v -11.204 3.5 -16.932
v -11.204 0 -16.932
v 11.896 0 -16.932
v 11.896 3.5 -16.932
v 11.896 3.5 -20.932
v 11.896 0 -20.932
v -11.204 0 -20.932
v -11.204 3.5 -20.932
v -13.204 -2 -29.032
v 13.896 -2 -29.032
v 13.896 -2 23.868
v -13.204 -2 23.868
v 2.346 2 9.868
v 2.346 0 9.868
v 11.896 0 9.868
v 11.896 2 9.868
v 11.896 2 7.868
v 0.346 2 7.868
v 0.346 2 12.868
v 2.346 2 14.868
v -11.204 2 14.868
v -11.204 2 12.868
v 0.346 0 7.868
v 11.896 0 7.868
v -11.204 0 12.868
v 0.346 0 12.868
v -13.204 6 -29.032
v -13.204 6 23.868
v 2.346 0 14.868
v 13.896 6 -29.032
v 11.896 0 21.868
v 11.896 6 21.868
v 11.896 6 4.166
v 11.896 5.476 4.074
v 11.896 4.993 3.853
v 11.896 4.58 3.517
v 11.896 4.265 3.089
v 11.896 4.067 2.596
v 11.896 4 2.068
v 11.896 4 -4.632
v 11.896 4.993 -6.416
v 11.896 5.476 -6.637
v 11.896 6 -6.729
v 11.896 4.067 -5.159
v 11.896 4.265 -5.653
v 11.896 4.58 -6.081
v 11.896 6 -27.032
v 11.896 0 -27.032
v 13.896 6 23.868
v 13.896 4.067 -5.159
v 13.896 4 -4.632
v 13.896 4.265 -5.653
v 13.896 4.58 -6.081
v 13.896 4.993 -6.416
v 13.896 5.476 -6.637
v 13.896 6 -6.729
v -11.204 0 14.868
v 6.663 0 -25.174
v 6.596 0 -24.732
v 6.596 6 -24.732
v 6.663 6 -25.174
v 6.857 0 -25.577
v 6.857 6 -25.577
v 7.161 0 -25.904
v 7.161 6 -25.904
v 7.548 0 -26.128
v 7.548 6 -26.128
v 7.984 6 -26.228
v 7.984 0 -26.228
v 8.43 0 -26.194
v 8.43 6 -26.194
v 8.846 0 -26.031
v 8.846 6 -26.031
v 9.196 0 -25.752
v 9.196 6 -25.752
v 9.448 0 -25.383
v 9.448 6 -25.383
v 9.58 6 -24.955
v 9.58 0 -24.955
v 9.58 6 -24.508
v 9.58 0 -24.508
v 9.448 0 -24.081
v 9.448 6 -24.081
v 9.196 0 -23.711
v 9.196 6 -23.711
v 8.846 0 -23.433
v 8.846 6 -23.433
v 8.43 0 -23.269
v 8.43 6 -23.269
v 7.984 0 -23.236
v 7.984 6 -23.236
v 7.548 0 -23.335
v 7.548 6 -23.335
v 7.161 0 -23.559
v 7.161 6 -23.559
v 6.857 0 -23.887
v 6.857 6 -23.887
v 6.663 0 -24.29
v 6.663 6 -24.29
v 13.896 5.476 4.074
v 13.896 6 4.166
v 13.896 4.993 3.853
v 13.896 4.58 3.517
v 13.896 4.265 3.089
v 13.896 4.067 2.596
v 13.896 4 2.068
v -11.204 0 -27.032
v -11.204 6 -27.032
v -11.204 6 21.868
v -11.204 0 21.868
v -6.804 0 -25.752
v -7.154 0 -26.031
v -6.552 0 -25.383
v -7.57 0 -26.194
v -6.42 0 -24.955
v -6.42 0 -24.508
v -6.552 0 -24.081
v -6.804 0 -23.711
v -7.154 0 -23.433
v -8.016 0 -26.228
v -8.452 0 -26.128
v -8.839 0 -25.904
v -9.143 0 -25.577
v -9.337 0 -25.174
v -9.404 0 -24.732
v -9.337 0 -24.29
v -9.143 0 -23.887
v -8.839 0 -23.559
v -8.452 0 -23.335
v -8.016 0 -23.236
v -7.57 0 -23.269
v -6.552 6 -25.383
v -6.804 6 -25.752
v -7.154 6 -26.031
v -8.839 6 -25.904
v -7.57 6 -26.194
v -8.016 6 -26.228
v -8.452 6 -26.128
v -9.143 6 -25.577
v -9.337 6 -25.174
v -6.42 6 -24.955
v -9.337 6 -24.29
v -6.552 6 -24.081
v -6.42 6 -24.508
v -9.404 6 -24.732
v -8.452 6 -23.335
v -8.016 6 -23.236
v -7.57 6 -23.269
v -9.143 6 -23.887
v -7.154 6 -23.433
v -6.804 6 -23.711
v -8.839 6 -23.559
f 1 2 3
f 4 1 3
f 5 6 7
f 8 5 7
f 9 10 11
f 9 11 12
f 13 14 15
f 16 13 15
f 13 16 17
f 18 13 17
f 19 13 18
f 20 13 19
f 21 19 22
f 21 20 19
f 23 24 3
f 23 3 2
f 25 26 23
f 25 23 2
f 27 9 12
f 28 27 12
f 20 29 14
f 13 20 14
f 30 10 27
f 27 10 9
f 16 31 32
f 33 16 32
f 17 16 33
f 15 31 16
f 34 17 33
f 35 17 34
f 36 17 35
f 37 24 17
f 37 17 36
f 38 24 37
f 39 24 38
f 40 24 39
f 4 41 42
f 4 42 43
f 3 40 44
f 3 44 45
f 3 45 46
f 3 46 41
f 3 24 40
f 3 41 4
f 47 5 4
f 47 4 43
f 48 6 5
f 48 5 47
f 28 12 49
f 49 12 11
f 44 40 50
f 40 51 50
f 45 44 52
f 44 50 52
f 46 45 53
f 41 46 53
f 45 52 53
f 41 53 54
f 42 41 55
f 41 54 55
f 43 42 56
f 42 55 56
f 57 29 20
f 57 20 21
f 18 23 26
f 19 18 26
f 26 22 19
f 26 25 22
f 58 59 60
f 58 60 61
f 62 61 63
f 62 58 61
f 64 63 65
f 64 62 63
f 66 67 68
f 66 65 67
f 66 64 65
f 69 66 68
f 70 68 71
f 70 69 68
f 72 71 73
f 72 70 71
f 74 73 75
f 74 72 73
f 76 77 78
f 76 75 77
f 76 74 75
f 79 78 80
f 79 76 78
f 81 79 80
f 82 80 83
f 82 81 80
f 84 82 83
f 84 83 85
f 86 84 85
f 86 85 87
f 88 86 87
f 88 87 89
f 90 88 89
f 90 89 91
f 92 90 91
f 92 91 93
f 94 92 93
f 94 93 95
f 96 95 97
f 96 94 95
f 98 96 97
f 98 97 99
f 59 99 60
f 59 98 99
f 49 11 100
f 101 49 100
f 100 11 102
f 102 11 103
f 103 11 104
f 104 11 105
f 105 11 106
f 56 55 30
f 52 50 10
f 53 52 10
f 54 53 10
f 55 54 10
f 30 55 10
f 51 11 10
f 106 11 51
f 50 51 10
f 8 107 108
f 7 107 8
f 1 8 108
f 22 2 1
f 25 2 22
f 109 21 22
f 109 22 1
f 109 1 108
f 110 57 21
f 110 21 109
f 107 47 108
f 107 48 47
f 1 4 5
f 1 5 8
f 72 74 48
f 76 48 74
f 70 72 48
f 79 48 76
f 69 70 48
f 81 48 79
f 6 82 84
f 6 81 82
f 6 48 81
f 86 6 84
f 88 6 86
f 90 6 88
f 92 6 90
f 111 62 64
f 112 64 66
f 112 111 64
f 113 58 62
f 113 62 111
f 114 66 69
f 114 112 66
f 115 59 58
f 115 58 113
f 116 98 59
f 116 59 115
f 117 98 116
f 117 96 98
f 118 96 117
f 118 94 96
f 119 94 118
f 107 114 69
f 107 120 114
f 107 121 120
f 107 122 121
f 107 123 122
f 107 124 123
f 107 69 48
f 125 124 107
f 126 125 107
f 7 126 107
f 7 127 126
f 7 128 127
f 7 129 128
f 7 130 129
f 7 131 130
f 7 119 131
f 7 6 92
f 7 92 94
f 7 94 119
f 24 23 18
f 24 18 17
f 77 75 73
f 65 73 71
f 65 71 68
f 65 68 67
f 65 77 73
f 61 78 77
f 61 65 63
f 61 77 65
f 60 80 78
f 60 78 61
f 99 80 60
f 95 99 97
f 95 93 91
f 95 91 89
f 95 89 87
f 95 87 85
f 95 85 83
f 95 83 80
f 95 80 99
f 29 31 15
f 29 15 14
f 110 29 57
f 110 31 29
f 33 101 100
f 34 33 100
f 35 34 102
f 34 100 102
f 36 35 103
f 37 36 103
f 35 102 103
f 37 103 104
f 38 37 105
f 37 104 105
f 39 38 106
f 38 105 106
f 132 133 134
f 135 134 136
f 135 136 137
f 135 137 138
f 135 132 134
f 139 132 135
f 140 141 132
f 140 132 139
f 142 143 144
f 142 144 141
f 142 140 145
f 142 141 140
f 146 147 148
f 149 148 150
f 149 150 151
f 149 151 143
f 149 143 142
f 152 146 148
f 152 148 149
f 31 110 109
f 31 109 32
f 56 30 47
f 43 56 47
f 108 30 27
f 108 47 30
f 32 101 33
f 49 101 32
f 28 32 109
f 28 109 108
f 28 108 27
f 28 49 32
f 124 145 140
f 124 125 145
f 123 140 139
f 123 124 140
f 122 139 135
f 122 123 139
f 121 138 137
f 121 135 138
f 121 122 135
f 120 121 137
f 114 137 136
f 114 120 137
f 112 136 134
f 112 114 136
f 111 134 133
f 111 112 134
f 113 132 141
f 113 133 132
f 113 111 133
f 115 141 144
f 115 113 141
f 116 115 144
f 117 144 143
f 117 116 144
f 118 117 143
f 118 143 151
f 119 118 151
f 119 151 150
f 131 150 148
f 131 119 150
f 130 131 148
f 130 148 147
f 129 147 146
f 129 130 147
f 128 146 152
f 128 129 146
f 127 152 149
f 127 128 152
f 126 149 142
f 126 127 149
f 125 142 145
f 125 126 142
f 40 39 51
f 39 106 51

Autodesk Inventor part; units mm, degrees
ref_plane "YZ Plane" through (0, 0, 0) normal (1, 0, 0) x (0, 1, 0)
ref_plane "XZ Plane" through (0, 0, 0) normal (0, 1, 0) x (-1, 0, 0)
ref_plane "XY Plane" through (0, 0, 0) normal (0, 0, 1) x (1, 0, 0)
sketch "Sketch1" plane through (0, 0, 0) normal (0, 1, 0) x (-1, 0, 0)
  circle A0 centre (-8.0963, -24.7317) radius 1.5
  circle A1 centre (7.9037, -24.7317) radius 1.5
  line L0 (-11.8963, -27.0317) -> (11.2037, -27.0317)
  line L1 (11.2037, 21.8683) -> (-11.8963, 21.8683)
  line L2 (-0.3463, 7.8683) -> (-0.3463, 9.8683)
  line L3 (-2.3463, 9.8683) -> (-11.8963, 9.8683)
  line L4 (-13.8963, -29.0317) -> (13.2037, -29.0317)
  line L5 (13.2037, -29.0317) -> (13.2037, 23.8683)
  line L6 (13.2037, 23.8683) -> (-13.8963, 23.8683)
  line L7 (-13.8963, 23.8683) -> (-13.8963, -29.0317)
  line L8 (-0.3463, 7.8683) -> (-11.8963, 7.8683)
  line L9 (-11.8963, 21.8683) -> (-11.8963, 7.8683)
  line L10 (11.2037, 12.8683) -> (-0.3463, 12.8683)
  line L11 (-0.3463, 9.8683) -> (-0.3463, 12.8683)
  line L12 (-2.3463, 14.8683) -> (-2.3463, 9.8683)
  line L13 (-2.3463, 14.8683) -> (11.2037, 14.8683)
  line L14 (11.2037, -16.9317) -> (-11.8963, -16.9317)
  line L15 (-11.8963, -20.9317) -> (11.2037, -20.9317)
  line L16 (-11.8963, 7.8683) -> (-11.8963, -20.9317)
  line L17 (-11.8963, -20.9317) -> (-11.8963, -27.0317)
  line L18 (11.2037, -27.0317) -> (11.2037, 21.8683)
  point P0 (0, 0)
  point P1 (-15.2463, -4.6317)
  dimension "d0" = 2
  dimension "d12" = 6.1
extrude "Extrusion1" add sketch "Sketch1" against normal blind 2 contours A0 | A1 | L17 L15 L18 L0 | L16 L14 L18 L15 | L16 L8 L2 L11 L10 L18 L14 | L9 L3 L12 L13 L18 L10 L11 L2 L8 | L9 L1 L18 L13 L12 L3 | L7 L6 L5 L4
extrude "Extrusion2" add sketch "Sketch1" along normal blind 6
extrude "Extrusion3" add sketch "Sketch1" along normal blind 2 contours L9 L3 L12 L13 L18 L10 L11 L2 L8
extrude "Extrusion4" add sketch "Sketch1" along normal blind 3.5 contours L16 L14 L18 L15
sketch "Sketch3" plane through (13.8963, -2, 23.8683) normal (1, 0, 0) x (0, 0, -1)
  arc A0 (30.6, 9.1) -> (28.5, 11.2) centre (28.5, 9.1) ccw
  arc A1 (21.8, 11.2) -> (19.7, 9.1) centre (21.8, 9.1) ccw
  line L0 (20.7, 8.1) -> (20.7, 9.1)
  line L1 (20.7, 8.1) -> (20.7, 9.1)
  line L2 (20.7, 9.1) -> (20.7, 8.1)
  arc A2 (21.8, 10.2) -> (20.7, 9.1) centre (21.8, 9.1) ccw
  line L3 (0, 0) -> (0, 8)
  line L4 (29.6, 9.1) -> (29.6, 8.1)
  line L5 (29.6, 8.1) -> (29.6, 9.1)
  line L6 (28.5, 10.2) -> (21.8, 10.2)
  arc A3 (29.6, 9.1) -> (28.5, 10.2) centre (28.5, 9.1) ccw
  line L7 (30.6, 8.1) -> (30.6, 9.1)
  line L8 (29.6, 8.1) -> (29.6, 9.1)
  arc A4 (28.5, 6) -> (30.6, 8.1) centre (28.5, 8.1) ccw
  line L9 (28.5, 11.2) -> (21.8, 11.2)
  line L10 (21.8, 10.2) -> (28.5, 10.2)
  line L11 (28.5, 10.2) -> (21.8, 10.2)
  line L12 (21.8, 7) -> (28.5, 7)
  line L13 (28.5, 7) -> (21.8, 7)
  line L14 (21.8, 6) -> (28.5, 6)
  line L15 (19.7, 9.1) -> (19.7, 8.1)
  arc A5 (20.7, 8.1) -> (21.8, 7) centre (21.8, 8.1) ccw
  arc A6 (19.7, 8.1) -> (21.8, 6) centre (21.8, 8.1) ccw
  line L16 (52.9, 8) -> (52.9, 0)
  line L17 (0, 8) -> (52.9, 8)
  line L18 (52.9, 0) -> (0, 0)
  arc A7 (28.5, 7) -> (29.6, 8.1) centre (28.5, 8.1) ccw
  point P0 (23.8683, 2)
  point P1 (29.0317, 2)
  point P2 (20.7, 10.2)
  point P3 (29.6, 7)
  point P4 (30.5976, 8)
  point P5 (19.7024, 8)
  dimension "d21" = 1.1
  dimension "d22" = 1
extrude "Extrusion6" cut sketch "Sketch3" against normal blind 6 contours A4 L14 A6 L17 A5 L12 A7 | A7 L12 A5 L17
properties part number "base"
